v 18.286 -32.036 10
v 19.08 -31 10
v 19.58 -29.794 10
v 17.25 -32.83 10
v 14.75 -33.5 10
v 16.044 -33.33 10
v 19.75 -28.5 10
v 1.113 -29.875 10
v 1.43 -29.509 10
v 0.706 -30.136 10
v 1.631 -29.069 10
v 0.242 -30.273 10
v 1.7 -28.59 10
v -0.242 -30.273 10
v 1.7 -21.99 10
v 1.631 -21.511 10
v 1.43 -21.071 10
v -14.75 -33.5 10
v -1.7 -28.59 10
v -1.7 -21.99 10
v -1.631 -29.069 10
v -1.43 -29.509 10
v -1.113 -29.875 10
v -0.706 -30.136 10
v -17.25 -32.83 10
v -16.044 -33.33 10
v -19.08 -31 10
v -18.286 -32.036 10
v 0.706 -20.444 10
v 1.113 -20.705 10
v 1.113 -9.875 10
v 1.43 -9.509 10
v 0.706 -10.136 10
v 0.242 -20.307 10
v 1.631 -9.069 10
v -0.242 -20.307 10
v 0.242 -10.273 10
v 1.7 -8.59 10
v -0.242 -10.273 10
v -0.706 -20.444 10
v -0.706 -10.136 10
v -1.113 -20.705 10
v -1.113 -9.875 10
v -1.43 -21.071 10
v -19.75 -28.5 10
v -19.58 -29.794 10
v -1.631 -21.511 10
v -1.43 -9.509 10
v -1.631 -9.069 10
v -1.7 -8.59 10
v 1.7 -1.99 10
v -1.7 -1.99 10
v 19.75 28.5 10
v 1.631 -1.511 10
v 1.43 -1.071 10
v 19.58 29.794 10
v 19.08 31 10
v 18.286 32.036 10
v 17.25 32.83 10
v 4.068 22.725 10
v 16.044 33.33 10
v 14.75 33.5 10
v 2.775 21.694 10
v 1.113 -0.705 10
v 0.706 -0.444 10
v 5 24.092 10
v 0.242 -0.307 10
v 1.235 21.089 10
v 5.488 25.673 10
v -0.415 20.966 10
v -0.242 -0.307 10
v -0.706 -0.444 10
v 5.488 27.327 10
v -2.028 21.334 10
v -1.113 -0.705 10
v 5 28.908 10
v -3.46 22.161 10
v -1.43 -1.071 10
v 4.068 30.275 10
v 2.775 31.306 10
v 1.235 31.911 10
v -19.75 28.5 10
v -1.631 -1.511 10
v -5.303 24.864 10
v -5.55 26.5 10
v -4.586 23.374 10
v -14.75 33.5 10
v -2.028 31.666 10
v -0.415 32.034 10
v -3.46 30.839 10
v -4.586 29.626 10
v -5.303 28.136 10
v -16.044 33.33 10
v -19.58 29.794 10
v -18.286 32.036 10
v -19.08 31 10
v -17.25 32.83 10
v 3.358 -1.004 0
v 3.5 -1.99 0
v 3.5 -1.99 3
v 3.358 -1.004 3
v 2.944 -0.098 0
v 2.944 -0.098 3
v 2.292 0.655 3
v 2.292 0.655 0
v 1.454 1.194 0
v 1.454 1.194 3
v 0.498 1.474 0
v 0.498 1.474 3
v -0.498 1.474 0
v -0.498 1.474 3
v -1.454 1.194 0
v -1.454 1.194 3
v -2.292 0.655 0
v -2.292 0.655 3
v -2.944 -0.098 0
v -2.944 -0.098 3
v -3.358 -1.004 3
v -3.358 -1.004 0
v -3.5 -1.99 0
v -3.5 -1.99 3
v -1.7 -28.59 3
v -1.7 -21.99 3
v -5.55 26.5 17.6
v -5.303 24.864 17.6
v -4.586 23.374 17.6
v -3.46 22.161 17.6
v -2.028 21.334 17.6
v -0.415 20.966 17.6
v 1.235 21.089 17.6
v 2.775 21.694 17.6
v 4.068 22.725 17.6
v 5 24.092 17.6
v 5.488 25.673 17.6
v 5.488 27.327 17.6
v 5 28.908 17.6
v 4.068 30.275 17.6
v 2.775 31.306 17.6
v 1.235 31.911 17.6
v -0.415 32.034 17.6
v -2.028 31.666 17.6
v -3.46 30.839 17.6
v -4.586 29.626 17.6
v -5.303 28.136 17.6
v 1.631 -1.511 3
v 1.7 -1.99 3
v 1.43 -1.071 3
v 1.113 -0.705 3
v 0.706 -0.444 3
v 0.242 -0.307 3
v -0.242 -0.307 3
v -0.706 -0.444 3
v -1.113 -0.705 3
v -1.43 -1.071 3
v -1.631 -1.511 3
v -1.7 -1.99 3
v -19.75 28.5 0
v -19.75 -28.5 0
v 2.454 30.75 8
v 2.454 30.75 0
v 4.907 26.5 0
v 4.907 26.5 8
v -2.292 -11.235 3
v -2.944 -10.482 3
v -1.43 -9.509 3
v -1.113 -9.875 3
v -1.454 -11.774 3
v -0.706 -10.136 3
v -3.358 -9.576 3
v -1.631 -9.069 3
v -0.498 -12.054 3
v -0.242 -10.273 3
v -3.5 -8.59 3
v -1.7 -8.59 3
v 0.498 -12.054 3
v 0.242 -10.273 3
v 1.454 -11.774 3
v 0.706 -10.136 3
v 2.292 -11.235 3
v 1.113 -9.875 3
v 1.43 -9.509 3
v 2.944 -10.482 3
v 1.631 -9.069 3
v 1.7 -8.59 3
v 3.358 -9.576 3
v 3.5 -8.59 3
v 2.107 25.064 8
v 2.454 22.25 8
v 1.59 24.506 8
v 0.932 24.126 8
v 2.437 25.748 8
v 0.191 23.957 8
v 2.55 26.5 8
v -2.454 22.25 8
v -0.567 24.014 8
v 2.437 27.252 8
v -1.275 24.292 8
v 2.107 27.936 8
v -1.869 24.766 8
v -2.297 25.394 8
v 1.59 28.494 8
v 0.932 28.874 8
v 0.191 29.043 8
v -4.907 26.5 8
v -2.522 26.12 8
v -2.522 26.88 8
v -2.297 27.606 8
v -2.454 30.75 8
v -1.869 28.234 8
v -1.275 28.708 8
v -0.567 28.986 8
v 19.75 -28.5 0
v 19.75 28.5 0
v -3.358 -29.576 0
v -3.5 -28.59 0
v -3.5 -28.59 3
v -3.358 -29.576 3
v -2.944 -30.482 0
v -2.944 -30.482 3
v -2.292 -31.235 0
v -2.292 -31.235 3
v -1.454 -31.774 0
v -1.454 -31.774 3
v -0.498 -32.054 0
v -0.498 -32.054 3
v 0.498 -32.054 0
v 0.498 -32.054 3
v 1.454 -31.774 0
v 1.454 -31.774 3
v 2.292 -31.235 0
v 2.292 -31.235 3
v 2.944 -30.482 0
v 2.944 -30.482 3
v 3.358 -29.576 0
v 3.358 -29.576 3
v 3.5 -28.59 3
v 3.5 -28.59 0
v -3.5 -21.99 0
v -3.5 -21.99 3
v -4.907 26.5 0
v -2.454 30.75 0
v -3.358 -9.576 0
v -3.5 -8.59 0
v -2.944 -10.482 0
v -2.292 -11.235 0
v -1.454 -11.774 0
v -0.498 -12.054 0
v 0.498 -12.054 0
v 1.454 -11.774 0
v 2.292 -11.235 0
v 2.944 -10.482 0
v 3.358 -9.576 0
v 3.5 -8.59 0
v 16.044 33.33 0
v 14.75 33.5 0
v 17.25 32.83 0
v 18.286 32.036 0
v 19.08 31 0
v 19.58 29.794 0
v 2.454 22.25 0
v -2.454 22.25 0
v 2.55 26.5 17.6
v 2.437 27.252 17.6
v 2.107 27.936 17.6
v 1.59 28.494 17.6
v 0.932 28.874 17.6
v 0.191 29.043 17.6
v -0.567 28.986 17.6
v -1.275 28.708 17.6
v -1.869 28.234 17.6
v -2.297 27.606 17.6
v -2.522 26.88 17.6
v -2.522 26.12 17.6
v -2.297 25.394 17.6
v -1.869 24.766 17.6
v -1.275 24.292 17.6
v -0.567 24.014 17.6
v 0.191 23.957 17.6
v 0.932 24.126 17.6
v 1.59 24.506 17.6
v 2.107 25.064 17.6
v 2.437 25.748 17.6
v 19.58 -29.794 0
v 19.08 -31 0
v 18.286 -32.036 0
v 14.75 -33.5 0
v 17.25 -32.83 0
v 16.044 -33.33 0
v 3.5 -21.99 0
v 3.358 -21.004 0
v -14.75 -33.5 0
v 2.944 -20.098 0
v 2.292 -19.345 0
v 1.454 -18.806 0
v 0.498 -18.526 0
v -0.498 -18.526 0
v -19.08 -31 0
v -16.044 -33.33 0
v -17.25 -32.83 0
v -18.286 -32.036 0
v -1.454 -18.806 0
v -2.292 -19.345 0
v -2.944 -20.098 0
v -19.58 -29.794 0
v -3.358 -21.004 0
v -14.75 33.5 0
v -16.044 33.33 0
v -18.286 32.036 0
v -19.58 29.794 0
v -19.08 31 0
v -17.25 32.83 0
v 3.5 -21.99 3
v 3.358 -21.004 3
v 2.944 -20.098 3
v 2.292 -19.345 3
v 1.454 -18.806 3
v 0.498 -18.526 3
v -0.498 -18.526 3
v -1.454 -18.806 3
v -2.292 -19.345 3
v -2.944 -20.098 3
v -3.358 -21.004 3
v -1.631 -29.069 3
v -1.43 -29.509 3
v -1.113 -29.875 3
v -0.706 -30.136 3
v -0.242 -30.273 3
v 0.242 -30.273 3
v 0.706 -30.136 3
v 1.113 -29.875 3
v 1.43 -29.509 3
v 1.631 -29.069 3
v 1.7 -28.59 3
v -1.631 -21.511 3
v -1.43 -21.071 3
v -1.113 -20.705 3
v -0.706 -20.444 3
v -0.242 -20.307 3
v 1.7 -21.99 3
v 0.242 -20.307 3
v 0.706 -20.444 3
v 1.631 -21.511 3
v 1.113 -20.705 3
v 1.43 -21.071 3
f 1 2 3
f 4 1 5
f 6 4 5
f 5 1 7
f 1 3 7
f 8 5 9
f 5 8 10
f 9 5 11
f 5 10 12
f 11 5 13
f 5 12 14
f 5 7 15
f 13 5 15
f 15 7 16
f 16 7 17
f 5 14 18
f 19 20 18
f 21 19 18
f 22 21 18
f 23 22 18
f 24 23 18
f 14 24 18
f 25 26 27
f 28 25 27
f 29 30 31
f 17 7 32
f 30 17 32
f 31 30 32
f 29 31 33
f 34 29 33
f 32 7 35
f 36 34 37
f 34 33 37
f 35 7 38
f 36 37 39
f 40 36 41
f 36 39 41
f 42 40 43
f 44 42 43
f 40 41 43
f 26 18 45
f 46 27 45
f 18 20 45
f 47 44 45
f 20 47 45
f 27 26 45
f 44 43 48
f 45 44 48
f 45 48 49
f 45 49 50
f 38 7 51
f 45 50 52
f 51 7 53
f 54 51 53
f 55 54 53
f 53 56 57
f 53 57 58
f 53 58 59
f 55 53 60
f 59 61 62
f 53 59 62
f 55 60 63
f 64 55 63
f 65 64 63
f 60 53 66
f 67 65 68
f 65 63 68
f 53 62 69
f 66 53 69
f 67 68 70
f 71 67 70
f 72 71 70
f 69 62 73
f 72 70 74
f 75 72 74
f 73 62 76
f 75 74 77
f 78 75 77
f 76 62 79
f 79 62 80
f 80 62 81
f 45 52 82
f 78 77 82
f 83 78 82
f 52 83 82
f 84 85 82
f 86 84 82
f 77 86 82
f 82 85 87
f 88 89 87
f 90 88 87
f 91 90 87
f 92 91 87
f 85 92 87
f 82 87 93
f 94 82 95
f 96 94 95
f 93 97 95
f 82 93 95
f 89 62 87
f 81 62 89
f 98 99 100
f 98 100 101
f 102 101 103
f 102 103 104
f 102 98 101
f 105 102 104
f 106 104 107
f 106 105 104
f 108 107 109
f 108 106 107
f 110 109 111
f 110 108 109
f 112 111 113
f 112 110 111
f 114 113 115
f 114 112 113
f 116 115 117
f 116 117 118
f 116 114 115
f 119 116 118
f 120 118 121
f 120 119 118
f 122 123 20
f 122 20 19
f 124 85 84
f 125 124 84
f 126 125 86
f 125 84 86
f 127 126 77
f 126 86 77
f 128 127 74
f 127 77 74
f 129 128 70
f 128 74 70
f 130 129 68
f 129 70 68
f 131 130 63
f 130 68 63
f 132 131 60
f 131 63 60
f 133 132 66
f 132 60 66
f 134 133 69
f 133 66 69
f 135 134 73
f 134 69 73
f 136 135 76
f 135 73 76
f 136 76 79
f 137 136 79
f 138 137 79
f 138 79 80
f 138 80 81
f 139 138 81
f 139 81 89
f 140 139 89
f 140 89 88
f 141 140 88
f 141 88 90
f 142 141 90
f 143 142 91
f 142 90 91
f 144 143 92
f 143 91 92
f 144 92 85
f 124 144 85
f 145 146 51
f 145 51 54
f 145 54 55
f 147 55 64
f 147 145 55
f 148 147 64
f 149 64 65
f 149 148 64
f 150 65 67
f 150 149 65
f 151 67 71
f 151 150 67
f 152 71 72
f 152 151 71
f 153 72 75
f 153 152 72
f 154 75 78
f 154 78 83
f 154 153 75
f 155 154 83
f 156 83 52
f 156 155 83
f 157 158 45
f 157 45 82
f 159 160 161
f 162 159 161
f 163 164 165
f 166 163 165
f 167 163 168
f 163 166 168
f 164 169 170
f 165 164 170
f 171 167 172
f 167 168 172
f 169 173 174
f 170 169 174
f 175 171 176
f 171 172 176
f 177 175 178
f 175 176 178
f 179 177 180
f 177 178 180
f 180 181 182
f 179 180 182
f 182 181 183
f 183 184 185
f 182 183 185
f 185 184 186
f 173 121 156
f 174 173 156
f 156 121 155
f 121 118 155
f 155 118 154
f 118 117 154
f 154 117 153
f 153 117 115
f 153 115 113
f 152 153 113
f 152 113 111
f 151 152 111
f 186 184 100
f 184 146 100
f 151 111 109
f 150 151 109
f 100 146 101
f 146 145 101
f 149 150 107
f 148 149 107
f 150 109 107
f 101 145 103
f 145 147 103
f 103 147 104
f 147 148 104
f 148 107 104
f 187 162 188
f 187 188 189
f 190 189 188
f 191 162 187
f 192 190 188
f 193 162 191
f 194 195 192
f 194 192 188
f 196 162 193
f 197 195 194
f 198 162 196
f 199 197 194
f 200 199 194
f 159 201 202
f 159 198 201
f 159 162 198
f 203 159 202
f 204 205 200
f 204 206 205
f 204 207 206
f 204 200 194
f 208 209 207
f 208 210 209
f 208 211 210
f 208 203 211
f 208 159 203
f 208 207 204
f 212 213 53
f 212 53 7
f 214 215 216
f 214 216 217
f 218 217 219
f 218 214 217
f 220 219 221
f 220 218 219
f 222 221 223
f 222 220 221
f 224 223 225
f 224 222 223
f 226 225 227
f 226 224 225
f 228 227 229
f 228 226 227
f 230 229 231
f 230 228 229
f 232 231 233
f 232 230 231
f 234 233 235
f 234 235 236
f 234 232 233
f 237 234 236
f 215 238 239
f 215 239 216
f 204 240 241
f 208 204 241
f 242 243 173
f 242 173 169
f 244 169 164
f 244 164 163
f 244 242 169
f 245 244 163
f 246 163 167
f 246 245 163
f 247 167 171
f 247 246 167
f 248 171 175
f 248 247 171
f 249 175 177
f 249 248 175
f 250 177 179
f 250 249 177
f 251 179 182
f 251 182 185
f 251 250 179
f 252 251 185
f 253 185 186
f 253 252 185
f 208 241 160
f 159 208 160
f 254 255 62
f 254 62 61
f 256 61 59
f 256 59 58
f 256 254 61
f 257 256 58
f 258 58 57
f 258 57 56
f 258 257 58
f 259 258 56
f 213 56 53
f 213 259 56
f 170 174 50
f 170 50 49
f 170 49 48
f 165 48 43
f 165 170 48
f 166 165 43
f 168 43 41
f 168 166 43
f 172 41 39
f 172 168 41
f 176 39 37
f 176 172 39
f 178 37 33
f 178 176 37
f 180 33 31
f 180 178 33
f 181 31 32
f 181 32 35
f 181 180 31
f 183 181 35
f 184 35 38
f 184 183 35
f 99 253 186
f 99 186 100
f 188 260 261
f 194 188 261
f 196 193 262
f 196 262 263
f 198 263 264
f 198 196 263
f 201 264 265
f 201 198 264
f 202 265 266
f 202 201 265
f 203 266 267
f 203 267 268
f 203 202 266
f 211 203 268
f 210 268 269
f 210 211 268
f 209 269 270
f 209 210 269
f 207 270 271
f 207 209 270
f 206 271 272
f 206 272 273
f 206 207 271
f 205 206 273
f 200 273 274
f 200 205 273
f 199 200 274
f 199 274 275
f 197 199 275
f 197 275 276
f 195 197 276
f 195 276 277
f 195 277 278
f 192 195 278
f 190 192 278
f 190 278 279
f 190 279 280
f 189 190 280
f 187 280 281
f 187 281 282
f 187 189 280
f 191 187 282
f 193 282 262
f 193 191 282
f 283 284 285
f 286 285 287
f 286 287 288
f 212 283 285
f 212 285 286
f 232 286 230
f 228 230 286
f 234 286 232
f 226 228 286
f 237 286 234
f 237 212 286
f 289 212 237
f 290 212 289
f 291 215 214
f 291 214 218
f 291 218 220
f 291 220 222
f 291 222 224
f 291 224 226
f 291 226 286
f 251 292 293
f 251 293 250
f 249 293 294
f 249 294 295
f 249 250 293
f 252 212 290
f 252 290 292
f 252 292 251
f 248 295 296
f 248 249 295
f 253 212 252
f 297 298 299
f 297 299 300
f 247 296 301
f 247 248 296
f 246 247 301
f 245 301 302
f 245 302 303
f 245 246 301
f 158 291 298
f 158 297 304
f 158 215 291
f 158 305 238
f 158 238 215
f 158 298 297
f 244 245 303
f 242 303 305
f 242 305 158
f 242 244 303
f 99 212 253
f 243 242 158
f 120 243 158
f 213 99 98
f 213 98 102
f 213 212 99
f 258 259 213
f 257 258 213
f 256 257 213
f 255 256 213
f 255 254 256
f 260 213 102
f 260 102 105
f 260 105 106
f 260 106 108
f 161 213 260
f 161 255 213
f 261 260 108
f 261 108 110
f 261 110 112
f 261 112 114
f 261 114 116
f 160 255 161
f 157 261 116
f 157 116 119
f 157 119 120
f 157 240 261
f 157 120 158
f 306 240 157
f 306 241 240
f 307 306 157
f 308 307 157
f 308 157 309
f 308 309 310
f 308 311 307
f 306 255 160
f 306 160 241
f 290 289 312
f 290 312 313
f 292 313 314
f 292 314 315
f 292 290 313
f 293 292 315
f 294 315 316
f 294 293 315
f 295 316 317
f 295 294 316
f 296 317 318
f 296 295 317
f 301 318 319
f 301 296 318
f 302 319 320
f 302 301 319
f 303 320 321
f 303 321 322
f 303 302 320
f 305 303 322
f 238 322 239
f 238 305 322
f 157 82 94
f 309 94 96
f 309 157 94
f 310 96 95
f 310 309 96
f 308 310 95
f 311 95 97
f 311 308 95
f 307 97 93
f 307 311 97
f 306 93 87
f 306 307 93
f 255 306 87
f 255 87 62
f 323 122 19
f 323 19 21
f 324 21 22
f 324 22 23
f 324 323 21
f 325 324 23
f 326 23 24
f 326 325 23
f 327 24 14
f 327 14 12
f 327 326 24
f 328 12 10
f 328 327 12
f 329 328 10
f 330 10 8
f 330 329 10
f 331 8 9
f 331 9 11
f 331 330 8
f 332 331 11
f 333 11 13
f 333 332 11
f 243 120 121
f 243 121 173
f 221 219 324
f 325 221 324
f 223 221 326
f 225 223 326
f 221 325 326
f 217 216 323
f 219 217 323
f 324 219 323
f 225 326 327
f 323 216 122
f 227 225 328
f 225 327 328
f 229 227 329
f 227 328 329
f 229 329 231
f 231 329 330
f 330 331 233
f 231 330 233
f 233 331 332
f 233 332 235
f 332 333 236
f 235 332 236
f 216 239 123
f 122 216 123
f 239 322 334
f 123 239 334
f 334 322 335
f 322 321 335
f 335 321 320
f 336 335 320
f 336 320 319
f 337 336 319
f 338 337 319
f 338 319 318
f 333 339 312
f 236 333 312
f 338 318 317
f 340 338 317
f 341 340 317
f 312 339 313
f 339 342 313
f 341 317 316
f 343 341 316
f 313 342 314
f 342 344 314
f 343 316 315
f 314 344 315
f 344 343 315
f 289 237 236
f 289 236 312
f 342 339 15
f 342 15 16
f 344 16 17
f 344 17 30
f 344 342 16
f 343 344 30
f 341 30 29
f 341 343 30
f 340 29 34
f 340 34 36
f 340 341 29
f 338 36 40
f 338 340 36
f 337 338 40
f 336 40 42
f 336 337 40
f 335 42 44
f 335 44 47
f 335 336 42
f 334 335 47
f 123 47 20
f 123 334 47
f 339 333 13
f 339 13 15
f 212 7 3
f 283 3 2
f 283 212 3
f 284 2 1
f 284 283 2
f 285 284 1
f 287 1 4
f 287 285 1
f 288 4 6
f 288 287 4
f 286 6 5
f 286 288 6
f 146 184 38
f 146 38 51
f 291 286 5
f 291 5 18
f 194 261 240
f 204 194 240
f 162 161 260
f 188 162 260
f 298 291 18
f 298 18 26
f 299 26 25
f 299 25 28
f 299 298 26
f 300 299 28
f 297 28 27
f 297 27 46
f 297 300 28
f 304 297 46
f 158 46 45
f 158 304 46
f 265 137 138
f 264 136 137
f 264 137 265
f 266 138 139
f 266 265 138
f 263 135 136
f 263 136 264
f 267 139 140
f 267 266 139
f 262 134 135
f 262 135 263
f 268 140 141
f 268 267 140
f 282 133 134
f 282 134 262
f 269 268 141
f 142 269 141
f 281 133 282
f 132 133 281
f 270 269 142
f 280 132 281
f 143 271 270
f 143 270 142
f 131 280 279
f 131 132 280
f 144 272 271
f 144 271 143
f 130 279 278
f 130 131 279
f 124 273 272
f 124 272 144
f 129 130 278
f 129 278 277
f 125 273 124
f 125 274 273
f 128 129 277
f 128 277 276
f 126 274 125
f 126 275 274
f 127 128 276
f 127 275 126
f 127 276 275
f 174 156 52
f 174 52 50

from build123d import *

# Parameters (mm, degrees)
SKETCH1_R                                    = 2.55
BOSS_EXTRUDE1_DEPTH                          = 10
SKETCH2_R                                    = 5.55
SKETCH2_R_2                                  = 2.55
BOSS_EXTRUDE2_DEPTH                          = 7.6
ENL_V_MAT_EXTRU_1_DEPTH                      = 8
RAINURE_DE_CHAMBRAGE_POUR_VIS_T_TE_RON_DEPTH = 10
RAINURE_DE_CHAMBRAGE_POUR_VIS_T_TE_3_DEPTH   = 3


# Read off the part's stored shape, not the designer's step: Rainure de chambrage pour vis à tête ronde bombée M32
with BuildPart() as part:
    # Sketch1 → Boss-Extrude1 (new body)
    with BuildSketch(Plane.XY):
        with BuildLine():
            Line((14.75, -33.5), (-14.75, -33.5))
            ThreePointArc((-14.75, -33.5), (-18.285533906, -32.035533906), (-19.75, -28.5))
            Line((-19.75, -28.5), (-19.75, 28.5))
            ThreePointArc((-19.75, 28.5), (-18.285533906, 32.035533906), (-14.75, 33.5))
            Line((-14.75, 33.5), (14.75, 33.5))
            ThreePointArc((14.75, 33.5), (18.285533906, 32.035533906), (19.75, 28.5))
            Line((19.75, 28.5), (19.75, -28.5))
            ThreePointArc((19.75, -28.5), (18.285533906, -32.035533906), (14.75, -33.5))
        make_face()
        with Locations((0, 26.5)):
            Circle(SKETCH1_R, mode=Mode.SUBTRACT)
    extrude(amount=BOSS_EXTRUDE1_DEPTH)

    # Sketch2 → Boss-Extrude2 (add)
    with BuildSketch(Plane.XY.offset(10)):
        with Locations(Location((0, 26.5, 0), (0, 0, 180))):
            Circle(SKETCH2_R)
        with Locations((0, 26.5)):
            Circle(SKETCH2_R_2, mode=Mode.SUBTRACT)
    extrude(amount=BOSS_EXTRUDE2_DEPTH)

    # Esquisse1 → Enlèv. mat.-Extru.1 (cut)
    with BuildSketch(Plane(origin=(0, 0, 0), x_dir=(-1, 0, 0), z_dir=(0, 0, -1))):
        Polygon((2.453738644, 22.25), (4.907477288, 26.5), (2.453738644, 30.75), (-2.453738644, 30.75), (-4.907477288, 26.5), (-2.453738644, 22.25), align=None)
    extrude(amount=-ENL_V_MAT_EXTRU_1_DEPTH, mode=Mode.SUBTRACT)

    # Rainure de chambrage pour vis _ t_te 2 → Rainure de chambrage pour vis à tête ronde bombée M32 (cut)
    with BuildSketch(Plane.XY):
        with BuildLine():
            ThreePointArc((1.7, -21.99), (0, -20.29), (-1.7, -21.99))
            Line((-1.7, -21.99), (-1.7, -28.59))
            ThreePointArc((-1.7, -28.59), (0, -30.29), (1.7, -28.59))
            Line((1.7, -28.59), (1.7, -21.99))
        make_face()
        with BuildLine():
            Line((1.7, -8.59), (1.7, -1.99))
            ThreePointArc((1.7, -1.99), (0, -0.29), (-1.7, -1.99))
            Line((-1.7, -1.99), (-1.7, -8.59))
            ThreePointArc((-1.7, -8.59), (0, -10.29), (1.7, -8.59))
        make_face()
    extrude(amount=RAINURE_DE_CHAMBRAGE_POUR_VIS_T_TE_RON_DEPTH, mode=Mode.SUBTRACT)

    # Rainure de chambrage pour vis _ t_te 3 o → Rainure de chambrage pour vis _ t_te 3 (cut)
    # profile 1 of 2: a face of its own
    with BuildSketch(Plane.XY):
        with BuildLine():
            ThreePointArc((3.5, -21.99), (0, -18.49), (-3.5, -21.99))
            Line((-3.5, -21.99), (-3.5, -28.59))
            ThreePointArc((-3.5, -28.59), (0, -32.09), (3.5, -28.59))
            Line((3.5, -28.59), (3.5, -21.99))
        make_face()
        with BuildLine():
            Line((-1.7, -28.59), (-1.7, -21.99))
            ThreePointArc((-1.7, -21.99), (0, -20.29), (1.7, -21.99))
            Line((1.7, -21.99), (1.7, -28.59))
            ThreePointArc((1.7, -28.59), (0, -30.29), (-1.7, -28.59))
        make_face(mode=Mode.SUBTRACT)
    # profile 2 of 2: a face of its own
    with BuildSketch(Plane.XY):
        with BuildLine():
            Line((3.5, -8.59), (3.5, -1.99))
            ThreePointArc((3.5, -1.99), (0, 1.51), (-3.5, -1.99))
            Line((-3.5, -1.99), (-3.5, -8.59))
            ThreePointArc((-3.5, -8.59), (0, -12.09), (3.5, -8.59))
        make_face()
        with BuildLine():
            ThreePointArc((-1.7, -1.99), (0, -0.29), (1.7, -1.99))
            Line((1.7, -1.99), (1.7, -8.59))
            ThreePointArc((1.7, -8.59), (0, -10.29), (-1.7, -8.59))
            Line((-1.7, -8.59), (-1.7, -1.99))
        make_face(mode=Mode.SUBTRACT)
    extrude(amount=RAINURE_DE_CHAMBRAGE_POUR_VIS_T_TE_3_DEPTH, mode=Mode.SUBTRACT)


solid = part.part
